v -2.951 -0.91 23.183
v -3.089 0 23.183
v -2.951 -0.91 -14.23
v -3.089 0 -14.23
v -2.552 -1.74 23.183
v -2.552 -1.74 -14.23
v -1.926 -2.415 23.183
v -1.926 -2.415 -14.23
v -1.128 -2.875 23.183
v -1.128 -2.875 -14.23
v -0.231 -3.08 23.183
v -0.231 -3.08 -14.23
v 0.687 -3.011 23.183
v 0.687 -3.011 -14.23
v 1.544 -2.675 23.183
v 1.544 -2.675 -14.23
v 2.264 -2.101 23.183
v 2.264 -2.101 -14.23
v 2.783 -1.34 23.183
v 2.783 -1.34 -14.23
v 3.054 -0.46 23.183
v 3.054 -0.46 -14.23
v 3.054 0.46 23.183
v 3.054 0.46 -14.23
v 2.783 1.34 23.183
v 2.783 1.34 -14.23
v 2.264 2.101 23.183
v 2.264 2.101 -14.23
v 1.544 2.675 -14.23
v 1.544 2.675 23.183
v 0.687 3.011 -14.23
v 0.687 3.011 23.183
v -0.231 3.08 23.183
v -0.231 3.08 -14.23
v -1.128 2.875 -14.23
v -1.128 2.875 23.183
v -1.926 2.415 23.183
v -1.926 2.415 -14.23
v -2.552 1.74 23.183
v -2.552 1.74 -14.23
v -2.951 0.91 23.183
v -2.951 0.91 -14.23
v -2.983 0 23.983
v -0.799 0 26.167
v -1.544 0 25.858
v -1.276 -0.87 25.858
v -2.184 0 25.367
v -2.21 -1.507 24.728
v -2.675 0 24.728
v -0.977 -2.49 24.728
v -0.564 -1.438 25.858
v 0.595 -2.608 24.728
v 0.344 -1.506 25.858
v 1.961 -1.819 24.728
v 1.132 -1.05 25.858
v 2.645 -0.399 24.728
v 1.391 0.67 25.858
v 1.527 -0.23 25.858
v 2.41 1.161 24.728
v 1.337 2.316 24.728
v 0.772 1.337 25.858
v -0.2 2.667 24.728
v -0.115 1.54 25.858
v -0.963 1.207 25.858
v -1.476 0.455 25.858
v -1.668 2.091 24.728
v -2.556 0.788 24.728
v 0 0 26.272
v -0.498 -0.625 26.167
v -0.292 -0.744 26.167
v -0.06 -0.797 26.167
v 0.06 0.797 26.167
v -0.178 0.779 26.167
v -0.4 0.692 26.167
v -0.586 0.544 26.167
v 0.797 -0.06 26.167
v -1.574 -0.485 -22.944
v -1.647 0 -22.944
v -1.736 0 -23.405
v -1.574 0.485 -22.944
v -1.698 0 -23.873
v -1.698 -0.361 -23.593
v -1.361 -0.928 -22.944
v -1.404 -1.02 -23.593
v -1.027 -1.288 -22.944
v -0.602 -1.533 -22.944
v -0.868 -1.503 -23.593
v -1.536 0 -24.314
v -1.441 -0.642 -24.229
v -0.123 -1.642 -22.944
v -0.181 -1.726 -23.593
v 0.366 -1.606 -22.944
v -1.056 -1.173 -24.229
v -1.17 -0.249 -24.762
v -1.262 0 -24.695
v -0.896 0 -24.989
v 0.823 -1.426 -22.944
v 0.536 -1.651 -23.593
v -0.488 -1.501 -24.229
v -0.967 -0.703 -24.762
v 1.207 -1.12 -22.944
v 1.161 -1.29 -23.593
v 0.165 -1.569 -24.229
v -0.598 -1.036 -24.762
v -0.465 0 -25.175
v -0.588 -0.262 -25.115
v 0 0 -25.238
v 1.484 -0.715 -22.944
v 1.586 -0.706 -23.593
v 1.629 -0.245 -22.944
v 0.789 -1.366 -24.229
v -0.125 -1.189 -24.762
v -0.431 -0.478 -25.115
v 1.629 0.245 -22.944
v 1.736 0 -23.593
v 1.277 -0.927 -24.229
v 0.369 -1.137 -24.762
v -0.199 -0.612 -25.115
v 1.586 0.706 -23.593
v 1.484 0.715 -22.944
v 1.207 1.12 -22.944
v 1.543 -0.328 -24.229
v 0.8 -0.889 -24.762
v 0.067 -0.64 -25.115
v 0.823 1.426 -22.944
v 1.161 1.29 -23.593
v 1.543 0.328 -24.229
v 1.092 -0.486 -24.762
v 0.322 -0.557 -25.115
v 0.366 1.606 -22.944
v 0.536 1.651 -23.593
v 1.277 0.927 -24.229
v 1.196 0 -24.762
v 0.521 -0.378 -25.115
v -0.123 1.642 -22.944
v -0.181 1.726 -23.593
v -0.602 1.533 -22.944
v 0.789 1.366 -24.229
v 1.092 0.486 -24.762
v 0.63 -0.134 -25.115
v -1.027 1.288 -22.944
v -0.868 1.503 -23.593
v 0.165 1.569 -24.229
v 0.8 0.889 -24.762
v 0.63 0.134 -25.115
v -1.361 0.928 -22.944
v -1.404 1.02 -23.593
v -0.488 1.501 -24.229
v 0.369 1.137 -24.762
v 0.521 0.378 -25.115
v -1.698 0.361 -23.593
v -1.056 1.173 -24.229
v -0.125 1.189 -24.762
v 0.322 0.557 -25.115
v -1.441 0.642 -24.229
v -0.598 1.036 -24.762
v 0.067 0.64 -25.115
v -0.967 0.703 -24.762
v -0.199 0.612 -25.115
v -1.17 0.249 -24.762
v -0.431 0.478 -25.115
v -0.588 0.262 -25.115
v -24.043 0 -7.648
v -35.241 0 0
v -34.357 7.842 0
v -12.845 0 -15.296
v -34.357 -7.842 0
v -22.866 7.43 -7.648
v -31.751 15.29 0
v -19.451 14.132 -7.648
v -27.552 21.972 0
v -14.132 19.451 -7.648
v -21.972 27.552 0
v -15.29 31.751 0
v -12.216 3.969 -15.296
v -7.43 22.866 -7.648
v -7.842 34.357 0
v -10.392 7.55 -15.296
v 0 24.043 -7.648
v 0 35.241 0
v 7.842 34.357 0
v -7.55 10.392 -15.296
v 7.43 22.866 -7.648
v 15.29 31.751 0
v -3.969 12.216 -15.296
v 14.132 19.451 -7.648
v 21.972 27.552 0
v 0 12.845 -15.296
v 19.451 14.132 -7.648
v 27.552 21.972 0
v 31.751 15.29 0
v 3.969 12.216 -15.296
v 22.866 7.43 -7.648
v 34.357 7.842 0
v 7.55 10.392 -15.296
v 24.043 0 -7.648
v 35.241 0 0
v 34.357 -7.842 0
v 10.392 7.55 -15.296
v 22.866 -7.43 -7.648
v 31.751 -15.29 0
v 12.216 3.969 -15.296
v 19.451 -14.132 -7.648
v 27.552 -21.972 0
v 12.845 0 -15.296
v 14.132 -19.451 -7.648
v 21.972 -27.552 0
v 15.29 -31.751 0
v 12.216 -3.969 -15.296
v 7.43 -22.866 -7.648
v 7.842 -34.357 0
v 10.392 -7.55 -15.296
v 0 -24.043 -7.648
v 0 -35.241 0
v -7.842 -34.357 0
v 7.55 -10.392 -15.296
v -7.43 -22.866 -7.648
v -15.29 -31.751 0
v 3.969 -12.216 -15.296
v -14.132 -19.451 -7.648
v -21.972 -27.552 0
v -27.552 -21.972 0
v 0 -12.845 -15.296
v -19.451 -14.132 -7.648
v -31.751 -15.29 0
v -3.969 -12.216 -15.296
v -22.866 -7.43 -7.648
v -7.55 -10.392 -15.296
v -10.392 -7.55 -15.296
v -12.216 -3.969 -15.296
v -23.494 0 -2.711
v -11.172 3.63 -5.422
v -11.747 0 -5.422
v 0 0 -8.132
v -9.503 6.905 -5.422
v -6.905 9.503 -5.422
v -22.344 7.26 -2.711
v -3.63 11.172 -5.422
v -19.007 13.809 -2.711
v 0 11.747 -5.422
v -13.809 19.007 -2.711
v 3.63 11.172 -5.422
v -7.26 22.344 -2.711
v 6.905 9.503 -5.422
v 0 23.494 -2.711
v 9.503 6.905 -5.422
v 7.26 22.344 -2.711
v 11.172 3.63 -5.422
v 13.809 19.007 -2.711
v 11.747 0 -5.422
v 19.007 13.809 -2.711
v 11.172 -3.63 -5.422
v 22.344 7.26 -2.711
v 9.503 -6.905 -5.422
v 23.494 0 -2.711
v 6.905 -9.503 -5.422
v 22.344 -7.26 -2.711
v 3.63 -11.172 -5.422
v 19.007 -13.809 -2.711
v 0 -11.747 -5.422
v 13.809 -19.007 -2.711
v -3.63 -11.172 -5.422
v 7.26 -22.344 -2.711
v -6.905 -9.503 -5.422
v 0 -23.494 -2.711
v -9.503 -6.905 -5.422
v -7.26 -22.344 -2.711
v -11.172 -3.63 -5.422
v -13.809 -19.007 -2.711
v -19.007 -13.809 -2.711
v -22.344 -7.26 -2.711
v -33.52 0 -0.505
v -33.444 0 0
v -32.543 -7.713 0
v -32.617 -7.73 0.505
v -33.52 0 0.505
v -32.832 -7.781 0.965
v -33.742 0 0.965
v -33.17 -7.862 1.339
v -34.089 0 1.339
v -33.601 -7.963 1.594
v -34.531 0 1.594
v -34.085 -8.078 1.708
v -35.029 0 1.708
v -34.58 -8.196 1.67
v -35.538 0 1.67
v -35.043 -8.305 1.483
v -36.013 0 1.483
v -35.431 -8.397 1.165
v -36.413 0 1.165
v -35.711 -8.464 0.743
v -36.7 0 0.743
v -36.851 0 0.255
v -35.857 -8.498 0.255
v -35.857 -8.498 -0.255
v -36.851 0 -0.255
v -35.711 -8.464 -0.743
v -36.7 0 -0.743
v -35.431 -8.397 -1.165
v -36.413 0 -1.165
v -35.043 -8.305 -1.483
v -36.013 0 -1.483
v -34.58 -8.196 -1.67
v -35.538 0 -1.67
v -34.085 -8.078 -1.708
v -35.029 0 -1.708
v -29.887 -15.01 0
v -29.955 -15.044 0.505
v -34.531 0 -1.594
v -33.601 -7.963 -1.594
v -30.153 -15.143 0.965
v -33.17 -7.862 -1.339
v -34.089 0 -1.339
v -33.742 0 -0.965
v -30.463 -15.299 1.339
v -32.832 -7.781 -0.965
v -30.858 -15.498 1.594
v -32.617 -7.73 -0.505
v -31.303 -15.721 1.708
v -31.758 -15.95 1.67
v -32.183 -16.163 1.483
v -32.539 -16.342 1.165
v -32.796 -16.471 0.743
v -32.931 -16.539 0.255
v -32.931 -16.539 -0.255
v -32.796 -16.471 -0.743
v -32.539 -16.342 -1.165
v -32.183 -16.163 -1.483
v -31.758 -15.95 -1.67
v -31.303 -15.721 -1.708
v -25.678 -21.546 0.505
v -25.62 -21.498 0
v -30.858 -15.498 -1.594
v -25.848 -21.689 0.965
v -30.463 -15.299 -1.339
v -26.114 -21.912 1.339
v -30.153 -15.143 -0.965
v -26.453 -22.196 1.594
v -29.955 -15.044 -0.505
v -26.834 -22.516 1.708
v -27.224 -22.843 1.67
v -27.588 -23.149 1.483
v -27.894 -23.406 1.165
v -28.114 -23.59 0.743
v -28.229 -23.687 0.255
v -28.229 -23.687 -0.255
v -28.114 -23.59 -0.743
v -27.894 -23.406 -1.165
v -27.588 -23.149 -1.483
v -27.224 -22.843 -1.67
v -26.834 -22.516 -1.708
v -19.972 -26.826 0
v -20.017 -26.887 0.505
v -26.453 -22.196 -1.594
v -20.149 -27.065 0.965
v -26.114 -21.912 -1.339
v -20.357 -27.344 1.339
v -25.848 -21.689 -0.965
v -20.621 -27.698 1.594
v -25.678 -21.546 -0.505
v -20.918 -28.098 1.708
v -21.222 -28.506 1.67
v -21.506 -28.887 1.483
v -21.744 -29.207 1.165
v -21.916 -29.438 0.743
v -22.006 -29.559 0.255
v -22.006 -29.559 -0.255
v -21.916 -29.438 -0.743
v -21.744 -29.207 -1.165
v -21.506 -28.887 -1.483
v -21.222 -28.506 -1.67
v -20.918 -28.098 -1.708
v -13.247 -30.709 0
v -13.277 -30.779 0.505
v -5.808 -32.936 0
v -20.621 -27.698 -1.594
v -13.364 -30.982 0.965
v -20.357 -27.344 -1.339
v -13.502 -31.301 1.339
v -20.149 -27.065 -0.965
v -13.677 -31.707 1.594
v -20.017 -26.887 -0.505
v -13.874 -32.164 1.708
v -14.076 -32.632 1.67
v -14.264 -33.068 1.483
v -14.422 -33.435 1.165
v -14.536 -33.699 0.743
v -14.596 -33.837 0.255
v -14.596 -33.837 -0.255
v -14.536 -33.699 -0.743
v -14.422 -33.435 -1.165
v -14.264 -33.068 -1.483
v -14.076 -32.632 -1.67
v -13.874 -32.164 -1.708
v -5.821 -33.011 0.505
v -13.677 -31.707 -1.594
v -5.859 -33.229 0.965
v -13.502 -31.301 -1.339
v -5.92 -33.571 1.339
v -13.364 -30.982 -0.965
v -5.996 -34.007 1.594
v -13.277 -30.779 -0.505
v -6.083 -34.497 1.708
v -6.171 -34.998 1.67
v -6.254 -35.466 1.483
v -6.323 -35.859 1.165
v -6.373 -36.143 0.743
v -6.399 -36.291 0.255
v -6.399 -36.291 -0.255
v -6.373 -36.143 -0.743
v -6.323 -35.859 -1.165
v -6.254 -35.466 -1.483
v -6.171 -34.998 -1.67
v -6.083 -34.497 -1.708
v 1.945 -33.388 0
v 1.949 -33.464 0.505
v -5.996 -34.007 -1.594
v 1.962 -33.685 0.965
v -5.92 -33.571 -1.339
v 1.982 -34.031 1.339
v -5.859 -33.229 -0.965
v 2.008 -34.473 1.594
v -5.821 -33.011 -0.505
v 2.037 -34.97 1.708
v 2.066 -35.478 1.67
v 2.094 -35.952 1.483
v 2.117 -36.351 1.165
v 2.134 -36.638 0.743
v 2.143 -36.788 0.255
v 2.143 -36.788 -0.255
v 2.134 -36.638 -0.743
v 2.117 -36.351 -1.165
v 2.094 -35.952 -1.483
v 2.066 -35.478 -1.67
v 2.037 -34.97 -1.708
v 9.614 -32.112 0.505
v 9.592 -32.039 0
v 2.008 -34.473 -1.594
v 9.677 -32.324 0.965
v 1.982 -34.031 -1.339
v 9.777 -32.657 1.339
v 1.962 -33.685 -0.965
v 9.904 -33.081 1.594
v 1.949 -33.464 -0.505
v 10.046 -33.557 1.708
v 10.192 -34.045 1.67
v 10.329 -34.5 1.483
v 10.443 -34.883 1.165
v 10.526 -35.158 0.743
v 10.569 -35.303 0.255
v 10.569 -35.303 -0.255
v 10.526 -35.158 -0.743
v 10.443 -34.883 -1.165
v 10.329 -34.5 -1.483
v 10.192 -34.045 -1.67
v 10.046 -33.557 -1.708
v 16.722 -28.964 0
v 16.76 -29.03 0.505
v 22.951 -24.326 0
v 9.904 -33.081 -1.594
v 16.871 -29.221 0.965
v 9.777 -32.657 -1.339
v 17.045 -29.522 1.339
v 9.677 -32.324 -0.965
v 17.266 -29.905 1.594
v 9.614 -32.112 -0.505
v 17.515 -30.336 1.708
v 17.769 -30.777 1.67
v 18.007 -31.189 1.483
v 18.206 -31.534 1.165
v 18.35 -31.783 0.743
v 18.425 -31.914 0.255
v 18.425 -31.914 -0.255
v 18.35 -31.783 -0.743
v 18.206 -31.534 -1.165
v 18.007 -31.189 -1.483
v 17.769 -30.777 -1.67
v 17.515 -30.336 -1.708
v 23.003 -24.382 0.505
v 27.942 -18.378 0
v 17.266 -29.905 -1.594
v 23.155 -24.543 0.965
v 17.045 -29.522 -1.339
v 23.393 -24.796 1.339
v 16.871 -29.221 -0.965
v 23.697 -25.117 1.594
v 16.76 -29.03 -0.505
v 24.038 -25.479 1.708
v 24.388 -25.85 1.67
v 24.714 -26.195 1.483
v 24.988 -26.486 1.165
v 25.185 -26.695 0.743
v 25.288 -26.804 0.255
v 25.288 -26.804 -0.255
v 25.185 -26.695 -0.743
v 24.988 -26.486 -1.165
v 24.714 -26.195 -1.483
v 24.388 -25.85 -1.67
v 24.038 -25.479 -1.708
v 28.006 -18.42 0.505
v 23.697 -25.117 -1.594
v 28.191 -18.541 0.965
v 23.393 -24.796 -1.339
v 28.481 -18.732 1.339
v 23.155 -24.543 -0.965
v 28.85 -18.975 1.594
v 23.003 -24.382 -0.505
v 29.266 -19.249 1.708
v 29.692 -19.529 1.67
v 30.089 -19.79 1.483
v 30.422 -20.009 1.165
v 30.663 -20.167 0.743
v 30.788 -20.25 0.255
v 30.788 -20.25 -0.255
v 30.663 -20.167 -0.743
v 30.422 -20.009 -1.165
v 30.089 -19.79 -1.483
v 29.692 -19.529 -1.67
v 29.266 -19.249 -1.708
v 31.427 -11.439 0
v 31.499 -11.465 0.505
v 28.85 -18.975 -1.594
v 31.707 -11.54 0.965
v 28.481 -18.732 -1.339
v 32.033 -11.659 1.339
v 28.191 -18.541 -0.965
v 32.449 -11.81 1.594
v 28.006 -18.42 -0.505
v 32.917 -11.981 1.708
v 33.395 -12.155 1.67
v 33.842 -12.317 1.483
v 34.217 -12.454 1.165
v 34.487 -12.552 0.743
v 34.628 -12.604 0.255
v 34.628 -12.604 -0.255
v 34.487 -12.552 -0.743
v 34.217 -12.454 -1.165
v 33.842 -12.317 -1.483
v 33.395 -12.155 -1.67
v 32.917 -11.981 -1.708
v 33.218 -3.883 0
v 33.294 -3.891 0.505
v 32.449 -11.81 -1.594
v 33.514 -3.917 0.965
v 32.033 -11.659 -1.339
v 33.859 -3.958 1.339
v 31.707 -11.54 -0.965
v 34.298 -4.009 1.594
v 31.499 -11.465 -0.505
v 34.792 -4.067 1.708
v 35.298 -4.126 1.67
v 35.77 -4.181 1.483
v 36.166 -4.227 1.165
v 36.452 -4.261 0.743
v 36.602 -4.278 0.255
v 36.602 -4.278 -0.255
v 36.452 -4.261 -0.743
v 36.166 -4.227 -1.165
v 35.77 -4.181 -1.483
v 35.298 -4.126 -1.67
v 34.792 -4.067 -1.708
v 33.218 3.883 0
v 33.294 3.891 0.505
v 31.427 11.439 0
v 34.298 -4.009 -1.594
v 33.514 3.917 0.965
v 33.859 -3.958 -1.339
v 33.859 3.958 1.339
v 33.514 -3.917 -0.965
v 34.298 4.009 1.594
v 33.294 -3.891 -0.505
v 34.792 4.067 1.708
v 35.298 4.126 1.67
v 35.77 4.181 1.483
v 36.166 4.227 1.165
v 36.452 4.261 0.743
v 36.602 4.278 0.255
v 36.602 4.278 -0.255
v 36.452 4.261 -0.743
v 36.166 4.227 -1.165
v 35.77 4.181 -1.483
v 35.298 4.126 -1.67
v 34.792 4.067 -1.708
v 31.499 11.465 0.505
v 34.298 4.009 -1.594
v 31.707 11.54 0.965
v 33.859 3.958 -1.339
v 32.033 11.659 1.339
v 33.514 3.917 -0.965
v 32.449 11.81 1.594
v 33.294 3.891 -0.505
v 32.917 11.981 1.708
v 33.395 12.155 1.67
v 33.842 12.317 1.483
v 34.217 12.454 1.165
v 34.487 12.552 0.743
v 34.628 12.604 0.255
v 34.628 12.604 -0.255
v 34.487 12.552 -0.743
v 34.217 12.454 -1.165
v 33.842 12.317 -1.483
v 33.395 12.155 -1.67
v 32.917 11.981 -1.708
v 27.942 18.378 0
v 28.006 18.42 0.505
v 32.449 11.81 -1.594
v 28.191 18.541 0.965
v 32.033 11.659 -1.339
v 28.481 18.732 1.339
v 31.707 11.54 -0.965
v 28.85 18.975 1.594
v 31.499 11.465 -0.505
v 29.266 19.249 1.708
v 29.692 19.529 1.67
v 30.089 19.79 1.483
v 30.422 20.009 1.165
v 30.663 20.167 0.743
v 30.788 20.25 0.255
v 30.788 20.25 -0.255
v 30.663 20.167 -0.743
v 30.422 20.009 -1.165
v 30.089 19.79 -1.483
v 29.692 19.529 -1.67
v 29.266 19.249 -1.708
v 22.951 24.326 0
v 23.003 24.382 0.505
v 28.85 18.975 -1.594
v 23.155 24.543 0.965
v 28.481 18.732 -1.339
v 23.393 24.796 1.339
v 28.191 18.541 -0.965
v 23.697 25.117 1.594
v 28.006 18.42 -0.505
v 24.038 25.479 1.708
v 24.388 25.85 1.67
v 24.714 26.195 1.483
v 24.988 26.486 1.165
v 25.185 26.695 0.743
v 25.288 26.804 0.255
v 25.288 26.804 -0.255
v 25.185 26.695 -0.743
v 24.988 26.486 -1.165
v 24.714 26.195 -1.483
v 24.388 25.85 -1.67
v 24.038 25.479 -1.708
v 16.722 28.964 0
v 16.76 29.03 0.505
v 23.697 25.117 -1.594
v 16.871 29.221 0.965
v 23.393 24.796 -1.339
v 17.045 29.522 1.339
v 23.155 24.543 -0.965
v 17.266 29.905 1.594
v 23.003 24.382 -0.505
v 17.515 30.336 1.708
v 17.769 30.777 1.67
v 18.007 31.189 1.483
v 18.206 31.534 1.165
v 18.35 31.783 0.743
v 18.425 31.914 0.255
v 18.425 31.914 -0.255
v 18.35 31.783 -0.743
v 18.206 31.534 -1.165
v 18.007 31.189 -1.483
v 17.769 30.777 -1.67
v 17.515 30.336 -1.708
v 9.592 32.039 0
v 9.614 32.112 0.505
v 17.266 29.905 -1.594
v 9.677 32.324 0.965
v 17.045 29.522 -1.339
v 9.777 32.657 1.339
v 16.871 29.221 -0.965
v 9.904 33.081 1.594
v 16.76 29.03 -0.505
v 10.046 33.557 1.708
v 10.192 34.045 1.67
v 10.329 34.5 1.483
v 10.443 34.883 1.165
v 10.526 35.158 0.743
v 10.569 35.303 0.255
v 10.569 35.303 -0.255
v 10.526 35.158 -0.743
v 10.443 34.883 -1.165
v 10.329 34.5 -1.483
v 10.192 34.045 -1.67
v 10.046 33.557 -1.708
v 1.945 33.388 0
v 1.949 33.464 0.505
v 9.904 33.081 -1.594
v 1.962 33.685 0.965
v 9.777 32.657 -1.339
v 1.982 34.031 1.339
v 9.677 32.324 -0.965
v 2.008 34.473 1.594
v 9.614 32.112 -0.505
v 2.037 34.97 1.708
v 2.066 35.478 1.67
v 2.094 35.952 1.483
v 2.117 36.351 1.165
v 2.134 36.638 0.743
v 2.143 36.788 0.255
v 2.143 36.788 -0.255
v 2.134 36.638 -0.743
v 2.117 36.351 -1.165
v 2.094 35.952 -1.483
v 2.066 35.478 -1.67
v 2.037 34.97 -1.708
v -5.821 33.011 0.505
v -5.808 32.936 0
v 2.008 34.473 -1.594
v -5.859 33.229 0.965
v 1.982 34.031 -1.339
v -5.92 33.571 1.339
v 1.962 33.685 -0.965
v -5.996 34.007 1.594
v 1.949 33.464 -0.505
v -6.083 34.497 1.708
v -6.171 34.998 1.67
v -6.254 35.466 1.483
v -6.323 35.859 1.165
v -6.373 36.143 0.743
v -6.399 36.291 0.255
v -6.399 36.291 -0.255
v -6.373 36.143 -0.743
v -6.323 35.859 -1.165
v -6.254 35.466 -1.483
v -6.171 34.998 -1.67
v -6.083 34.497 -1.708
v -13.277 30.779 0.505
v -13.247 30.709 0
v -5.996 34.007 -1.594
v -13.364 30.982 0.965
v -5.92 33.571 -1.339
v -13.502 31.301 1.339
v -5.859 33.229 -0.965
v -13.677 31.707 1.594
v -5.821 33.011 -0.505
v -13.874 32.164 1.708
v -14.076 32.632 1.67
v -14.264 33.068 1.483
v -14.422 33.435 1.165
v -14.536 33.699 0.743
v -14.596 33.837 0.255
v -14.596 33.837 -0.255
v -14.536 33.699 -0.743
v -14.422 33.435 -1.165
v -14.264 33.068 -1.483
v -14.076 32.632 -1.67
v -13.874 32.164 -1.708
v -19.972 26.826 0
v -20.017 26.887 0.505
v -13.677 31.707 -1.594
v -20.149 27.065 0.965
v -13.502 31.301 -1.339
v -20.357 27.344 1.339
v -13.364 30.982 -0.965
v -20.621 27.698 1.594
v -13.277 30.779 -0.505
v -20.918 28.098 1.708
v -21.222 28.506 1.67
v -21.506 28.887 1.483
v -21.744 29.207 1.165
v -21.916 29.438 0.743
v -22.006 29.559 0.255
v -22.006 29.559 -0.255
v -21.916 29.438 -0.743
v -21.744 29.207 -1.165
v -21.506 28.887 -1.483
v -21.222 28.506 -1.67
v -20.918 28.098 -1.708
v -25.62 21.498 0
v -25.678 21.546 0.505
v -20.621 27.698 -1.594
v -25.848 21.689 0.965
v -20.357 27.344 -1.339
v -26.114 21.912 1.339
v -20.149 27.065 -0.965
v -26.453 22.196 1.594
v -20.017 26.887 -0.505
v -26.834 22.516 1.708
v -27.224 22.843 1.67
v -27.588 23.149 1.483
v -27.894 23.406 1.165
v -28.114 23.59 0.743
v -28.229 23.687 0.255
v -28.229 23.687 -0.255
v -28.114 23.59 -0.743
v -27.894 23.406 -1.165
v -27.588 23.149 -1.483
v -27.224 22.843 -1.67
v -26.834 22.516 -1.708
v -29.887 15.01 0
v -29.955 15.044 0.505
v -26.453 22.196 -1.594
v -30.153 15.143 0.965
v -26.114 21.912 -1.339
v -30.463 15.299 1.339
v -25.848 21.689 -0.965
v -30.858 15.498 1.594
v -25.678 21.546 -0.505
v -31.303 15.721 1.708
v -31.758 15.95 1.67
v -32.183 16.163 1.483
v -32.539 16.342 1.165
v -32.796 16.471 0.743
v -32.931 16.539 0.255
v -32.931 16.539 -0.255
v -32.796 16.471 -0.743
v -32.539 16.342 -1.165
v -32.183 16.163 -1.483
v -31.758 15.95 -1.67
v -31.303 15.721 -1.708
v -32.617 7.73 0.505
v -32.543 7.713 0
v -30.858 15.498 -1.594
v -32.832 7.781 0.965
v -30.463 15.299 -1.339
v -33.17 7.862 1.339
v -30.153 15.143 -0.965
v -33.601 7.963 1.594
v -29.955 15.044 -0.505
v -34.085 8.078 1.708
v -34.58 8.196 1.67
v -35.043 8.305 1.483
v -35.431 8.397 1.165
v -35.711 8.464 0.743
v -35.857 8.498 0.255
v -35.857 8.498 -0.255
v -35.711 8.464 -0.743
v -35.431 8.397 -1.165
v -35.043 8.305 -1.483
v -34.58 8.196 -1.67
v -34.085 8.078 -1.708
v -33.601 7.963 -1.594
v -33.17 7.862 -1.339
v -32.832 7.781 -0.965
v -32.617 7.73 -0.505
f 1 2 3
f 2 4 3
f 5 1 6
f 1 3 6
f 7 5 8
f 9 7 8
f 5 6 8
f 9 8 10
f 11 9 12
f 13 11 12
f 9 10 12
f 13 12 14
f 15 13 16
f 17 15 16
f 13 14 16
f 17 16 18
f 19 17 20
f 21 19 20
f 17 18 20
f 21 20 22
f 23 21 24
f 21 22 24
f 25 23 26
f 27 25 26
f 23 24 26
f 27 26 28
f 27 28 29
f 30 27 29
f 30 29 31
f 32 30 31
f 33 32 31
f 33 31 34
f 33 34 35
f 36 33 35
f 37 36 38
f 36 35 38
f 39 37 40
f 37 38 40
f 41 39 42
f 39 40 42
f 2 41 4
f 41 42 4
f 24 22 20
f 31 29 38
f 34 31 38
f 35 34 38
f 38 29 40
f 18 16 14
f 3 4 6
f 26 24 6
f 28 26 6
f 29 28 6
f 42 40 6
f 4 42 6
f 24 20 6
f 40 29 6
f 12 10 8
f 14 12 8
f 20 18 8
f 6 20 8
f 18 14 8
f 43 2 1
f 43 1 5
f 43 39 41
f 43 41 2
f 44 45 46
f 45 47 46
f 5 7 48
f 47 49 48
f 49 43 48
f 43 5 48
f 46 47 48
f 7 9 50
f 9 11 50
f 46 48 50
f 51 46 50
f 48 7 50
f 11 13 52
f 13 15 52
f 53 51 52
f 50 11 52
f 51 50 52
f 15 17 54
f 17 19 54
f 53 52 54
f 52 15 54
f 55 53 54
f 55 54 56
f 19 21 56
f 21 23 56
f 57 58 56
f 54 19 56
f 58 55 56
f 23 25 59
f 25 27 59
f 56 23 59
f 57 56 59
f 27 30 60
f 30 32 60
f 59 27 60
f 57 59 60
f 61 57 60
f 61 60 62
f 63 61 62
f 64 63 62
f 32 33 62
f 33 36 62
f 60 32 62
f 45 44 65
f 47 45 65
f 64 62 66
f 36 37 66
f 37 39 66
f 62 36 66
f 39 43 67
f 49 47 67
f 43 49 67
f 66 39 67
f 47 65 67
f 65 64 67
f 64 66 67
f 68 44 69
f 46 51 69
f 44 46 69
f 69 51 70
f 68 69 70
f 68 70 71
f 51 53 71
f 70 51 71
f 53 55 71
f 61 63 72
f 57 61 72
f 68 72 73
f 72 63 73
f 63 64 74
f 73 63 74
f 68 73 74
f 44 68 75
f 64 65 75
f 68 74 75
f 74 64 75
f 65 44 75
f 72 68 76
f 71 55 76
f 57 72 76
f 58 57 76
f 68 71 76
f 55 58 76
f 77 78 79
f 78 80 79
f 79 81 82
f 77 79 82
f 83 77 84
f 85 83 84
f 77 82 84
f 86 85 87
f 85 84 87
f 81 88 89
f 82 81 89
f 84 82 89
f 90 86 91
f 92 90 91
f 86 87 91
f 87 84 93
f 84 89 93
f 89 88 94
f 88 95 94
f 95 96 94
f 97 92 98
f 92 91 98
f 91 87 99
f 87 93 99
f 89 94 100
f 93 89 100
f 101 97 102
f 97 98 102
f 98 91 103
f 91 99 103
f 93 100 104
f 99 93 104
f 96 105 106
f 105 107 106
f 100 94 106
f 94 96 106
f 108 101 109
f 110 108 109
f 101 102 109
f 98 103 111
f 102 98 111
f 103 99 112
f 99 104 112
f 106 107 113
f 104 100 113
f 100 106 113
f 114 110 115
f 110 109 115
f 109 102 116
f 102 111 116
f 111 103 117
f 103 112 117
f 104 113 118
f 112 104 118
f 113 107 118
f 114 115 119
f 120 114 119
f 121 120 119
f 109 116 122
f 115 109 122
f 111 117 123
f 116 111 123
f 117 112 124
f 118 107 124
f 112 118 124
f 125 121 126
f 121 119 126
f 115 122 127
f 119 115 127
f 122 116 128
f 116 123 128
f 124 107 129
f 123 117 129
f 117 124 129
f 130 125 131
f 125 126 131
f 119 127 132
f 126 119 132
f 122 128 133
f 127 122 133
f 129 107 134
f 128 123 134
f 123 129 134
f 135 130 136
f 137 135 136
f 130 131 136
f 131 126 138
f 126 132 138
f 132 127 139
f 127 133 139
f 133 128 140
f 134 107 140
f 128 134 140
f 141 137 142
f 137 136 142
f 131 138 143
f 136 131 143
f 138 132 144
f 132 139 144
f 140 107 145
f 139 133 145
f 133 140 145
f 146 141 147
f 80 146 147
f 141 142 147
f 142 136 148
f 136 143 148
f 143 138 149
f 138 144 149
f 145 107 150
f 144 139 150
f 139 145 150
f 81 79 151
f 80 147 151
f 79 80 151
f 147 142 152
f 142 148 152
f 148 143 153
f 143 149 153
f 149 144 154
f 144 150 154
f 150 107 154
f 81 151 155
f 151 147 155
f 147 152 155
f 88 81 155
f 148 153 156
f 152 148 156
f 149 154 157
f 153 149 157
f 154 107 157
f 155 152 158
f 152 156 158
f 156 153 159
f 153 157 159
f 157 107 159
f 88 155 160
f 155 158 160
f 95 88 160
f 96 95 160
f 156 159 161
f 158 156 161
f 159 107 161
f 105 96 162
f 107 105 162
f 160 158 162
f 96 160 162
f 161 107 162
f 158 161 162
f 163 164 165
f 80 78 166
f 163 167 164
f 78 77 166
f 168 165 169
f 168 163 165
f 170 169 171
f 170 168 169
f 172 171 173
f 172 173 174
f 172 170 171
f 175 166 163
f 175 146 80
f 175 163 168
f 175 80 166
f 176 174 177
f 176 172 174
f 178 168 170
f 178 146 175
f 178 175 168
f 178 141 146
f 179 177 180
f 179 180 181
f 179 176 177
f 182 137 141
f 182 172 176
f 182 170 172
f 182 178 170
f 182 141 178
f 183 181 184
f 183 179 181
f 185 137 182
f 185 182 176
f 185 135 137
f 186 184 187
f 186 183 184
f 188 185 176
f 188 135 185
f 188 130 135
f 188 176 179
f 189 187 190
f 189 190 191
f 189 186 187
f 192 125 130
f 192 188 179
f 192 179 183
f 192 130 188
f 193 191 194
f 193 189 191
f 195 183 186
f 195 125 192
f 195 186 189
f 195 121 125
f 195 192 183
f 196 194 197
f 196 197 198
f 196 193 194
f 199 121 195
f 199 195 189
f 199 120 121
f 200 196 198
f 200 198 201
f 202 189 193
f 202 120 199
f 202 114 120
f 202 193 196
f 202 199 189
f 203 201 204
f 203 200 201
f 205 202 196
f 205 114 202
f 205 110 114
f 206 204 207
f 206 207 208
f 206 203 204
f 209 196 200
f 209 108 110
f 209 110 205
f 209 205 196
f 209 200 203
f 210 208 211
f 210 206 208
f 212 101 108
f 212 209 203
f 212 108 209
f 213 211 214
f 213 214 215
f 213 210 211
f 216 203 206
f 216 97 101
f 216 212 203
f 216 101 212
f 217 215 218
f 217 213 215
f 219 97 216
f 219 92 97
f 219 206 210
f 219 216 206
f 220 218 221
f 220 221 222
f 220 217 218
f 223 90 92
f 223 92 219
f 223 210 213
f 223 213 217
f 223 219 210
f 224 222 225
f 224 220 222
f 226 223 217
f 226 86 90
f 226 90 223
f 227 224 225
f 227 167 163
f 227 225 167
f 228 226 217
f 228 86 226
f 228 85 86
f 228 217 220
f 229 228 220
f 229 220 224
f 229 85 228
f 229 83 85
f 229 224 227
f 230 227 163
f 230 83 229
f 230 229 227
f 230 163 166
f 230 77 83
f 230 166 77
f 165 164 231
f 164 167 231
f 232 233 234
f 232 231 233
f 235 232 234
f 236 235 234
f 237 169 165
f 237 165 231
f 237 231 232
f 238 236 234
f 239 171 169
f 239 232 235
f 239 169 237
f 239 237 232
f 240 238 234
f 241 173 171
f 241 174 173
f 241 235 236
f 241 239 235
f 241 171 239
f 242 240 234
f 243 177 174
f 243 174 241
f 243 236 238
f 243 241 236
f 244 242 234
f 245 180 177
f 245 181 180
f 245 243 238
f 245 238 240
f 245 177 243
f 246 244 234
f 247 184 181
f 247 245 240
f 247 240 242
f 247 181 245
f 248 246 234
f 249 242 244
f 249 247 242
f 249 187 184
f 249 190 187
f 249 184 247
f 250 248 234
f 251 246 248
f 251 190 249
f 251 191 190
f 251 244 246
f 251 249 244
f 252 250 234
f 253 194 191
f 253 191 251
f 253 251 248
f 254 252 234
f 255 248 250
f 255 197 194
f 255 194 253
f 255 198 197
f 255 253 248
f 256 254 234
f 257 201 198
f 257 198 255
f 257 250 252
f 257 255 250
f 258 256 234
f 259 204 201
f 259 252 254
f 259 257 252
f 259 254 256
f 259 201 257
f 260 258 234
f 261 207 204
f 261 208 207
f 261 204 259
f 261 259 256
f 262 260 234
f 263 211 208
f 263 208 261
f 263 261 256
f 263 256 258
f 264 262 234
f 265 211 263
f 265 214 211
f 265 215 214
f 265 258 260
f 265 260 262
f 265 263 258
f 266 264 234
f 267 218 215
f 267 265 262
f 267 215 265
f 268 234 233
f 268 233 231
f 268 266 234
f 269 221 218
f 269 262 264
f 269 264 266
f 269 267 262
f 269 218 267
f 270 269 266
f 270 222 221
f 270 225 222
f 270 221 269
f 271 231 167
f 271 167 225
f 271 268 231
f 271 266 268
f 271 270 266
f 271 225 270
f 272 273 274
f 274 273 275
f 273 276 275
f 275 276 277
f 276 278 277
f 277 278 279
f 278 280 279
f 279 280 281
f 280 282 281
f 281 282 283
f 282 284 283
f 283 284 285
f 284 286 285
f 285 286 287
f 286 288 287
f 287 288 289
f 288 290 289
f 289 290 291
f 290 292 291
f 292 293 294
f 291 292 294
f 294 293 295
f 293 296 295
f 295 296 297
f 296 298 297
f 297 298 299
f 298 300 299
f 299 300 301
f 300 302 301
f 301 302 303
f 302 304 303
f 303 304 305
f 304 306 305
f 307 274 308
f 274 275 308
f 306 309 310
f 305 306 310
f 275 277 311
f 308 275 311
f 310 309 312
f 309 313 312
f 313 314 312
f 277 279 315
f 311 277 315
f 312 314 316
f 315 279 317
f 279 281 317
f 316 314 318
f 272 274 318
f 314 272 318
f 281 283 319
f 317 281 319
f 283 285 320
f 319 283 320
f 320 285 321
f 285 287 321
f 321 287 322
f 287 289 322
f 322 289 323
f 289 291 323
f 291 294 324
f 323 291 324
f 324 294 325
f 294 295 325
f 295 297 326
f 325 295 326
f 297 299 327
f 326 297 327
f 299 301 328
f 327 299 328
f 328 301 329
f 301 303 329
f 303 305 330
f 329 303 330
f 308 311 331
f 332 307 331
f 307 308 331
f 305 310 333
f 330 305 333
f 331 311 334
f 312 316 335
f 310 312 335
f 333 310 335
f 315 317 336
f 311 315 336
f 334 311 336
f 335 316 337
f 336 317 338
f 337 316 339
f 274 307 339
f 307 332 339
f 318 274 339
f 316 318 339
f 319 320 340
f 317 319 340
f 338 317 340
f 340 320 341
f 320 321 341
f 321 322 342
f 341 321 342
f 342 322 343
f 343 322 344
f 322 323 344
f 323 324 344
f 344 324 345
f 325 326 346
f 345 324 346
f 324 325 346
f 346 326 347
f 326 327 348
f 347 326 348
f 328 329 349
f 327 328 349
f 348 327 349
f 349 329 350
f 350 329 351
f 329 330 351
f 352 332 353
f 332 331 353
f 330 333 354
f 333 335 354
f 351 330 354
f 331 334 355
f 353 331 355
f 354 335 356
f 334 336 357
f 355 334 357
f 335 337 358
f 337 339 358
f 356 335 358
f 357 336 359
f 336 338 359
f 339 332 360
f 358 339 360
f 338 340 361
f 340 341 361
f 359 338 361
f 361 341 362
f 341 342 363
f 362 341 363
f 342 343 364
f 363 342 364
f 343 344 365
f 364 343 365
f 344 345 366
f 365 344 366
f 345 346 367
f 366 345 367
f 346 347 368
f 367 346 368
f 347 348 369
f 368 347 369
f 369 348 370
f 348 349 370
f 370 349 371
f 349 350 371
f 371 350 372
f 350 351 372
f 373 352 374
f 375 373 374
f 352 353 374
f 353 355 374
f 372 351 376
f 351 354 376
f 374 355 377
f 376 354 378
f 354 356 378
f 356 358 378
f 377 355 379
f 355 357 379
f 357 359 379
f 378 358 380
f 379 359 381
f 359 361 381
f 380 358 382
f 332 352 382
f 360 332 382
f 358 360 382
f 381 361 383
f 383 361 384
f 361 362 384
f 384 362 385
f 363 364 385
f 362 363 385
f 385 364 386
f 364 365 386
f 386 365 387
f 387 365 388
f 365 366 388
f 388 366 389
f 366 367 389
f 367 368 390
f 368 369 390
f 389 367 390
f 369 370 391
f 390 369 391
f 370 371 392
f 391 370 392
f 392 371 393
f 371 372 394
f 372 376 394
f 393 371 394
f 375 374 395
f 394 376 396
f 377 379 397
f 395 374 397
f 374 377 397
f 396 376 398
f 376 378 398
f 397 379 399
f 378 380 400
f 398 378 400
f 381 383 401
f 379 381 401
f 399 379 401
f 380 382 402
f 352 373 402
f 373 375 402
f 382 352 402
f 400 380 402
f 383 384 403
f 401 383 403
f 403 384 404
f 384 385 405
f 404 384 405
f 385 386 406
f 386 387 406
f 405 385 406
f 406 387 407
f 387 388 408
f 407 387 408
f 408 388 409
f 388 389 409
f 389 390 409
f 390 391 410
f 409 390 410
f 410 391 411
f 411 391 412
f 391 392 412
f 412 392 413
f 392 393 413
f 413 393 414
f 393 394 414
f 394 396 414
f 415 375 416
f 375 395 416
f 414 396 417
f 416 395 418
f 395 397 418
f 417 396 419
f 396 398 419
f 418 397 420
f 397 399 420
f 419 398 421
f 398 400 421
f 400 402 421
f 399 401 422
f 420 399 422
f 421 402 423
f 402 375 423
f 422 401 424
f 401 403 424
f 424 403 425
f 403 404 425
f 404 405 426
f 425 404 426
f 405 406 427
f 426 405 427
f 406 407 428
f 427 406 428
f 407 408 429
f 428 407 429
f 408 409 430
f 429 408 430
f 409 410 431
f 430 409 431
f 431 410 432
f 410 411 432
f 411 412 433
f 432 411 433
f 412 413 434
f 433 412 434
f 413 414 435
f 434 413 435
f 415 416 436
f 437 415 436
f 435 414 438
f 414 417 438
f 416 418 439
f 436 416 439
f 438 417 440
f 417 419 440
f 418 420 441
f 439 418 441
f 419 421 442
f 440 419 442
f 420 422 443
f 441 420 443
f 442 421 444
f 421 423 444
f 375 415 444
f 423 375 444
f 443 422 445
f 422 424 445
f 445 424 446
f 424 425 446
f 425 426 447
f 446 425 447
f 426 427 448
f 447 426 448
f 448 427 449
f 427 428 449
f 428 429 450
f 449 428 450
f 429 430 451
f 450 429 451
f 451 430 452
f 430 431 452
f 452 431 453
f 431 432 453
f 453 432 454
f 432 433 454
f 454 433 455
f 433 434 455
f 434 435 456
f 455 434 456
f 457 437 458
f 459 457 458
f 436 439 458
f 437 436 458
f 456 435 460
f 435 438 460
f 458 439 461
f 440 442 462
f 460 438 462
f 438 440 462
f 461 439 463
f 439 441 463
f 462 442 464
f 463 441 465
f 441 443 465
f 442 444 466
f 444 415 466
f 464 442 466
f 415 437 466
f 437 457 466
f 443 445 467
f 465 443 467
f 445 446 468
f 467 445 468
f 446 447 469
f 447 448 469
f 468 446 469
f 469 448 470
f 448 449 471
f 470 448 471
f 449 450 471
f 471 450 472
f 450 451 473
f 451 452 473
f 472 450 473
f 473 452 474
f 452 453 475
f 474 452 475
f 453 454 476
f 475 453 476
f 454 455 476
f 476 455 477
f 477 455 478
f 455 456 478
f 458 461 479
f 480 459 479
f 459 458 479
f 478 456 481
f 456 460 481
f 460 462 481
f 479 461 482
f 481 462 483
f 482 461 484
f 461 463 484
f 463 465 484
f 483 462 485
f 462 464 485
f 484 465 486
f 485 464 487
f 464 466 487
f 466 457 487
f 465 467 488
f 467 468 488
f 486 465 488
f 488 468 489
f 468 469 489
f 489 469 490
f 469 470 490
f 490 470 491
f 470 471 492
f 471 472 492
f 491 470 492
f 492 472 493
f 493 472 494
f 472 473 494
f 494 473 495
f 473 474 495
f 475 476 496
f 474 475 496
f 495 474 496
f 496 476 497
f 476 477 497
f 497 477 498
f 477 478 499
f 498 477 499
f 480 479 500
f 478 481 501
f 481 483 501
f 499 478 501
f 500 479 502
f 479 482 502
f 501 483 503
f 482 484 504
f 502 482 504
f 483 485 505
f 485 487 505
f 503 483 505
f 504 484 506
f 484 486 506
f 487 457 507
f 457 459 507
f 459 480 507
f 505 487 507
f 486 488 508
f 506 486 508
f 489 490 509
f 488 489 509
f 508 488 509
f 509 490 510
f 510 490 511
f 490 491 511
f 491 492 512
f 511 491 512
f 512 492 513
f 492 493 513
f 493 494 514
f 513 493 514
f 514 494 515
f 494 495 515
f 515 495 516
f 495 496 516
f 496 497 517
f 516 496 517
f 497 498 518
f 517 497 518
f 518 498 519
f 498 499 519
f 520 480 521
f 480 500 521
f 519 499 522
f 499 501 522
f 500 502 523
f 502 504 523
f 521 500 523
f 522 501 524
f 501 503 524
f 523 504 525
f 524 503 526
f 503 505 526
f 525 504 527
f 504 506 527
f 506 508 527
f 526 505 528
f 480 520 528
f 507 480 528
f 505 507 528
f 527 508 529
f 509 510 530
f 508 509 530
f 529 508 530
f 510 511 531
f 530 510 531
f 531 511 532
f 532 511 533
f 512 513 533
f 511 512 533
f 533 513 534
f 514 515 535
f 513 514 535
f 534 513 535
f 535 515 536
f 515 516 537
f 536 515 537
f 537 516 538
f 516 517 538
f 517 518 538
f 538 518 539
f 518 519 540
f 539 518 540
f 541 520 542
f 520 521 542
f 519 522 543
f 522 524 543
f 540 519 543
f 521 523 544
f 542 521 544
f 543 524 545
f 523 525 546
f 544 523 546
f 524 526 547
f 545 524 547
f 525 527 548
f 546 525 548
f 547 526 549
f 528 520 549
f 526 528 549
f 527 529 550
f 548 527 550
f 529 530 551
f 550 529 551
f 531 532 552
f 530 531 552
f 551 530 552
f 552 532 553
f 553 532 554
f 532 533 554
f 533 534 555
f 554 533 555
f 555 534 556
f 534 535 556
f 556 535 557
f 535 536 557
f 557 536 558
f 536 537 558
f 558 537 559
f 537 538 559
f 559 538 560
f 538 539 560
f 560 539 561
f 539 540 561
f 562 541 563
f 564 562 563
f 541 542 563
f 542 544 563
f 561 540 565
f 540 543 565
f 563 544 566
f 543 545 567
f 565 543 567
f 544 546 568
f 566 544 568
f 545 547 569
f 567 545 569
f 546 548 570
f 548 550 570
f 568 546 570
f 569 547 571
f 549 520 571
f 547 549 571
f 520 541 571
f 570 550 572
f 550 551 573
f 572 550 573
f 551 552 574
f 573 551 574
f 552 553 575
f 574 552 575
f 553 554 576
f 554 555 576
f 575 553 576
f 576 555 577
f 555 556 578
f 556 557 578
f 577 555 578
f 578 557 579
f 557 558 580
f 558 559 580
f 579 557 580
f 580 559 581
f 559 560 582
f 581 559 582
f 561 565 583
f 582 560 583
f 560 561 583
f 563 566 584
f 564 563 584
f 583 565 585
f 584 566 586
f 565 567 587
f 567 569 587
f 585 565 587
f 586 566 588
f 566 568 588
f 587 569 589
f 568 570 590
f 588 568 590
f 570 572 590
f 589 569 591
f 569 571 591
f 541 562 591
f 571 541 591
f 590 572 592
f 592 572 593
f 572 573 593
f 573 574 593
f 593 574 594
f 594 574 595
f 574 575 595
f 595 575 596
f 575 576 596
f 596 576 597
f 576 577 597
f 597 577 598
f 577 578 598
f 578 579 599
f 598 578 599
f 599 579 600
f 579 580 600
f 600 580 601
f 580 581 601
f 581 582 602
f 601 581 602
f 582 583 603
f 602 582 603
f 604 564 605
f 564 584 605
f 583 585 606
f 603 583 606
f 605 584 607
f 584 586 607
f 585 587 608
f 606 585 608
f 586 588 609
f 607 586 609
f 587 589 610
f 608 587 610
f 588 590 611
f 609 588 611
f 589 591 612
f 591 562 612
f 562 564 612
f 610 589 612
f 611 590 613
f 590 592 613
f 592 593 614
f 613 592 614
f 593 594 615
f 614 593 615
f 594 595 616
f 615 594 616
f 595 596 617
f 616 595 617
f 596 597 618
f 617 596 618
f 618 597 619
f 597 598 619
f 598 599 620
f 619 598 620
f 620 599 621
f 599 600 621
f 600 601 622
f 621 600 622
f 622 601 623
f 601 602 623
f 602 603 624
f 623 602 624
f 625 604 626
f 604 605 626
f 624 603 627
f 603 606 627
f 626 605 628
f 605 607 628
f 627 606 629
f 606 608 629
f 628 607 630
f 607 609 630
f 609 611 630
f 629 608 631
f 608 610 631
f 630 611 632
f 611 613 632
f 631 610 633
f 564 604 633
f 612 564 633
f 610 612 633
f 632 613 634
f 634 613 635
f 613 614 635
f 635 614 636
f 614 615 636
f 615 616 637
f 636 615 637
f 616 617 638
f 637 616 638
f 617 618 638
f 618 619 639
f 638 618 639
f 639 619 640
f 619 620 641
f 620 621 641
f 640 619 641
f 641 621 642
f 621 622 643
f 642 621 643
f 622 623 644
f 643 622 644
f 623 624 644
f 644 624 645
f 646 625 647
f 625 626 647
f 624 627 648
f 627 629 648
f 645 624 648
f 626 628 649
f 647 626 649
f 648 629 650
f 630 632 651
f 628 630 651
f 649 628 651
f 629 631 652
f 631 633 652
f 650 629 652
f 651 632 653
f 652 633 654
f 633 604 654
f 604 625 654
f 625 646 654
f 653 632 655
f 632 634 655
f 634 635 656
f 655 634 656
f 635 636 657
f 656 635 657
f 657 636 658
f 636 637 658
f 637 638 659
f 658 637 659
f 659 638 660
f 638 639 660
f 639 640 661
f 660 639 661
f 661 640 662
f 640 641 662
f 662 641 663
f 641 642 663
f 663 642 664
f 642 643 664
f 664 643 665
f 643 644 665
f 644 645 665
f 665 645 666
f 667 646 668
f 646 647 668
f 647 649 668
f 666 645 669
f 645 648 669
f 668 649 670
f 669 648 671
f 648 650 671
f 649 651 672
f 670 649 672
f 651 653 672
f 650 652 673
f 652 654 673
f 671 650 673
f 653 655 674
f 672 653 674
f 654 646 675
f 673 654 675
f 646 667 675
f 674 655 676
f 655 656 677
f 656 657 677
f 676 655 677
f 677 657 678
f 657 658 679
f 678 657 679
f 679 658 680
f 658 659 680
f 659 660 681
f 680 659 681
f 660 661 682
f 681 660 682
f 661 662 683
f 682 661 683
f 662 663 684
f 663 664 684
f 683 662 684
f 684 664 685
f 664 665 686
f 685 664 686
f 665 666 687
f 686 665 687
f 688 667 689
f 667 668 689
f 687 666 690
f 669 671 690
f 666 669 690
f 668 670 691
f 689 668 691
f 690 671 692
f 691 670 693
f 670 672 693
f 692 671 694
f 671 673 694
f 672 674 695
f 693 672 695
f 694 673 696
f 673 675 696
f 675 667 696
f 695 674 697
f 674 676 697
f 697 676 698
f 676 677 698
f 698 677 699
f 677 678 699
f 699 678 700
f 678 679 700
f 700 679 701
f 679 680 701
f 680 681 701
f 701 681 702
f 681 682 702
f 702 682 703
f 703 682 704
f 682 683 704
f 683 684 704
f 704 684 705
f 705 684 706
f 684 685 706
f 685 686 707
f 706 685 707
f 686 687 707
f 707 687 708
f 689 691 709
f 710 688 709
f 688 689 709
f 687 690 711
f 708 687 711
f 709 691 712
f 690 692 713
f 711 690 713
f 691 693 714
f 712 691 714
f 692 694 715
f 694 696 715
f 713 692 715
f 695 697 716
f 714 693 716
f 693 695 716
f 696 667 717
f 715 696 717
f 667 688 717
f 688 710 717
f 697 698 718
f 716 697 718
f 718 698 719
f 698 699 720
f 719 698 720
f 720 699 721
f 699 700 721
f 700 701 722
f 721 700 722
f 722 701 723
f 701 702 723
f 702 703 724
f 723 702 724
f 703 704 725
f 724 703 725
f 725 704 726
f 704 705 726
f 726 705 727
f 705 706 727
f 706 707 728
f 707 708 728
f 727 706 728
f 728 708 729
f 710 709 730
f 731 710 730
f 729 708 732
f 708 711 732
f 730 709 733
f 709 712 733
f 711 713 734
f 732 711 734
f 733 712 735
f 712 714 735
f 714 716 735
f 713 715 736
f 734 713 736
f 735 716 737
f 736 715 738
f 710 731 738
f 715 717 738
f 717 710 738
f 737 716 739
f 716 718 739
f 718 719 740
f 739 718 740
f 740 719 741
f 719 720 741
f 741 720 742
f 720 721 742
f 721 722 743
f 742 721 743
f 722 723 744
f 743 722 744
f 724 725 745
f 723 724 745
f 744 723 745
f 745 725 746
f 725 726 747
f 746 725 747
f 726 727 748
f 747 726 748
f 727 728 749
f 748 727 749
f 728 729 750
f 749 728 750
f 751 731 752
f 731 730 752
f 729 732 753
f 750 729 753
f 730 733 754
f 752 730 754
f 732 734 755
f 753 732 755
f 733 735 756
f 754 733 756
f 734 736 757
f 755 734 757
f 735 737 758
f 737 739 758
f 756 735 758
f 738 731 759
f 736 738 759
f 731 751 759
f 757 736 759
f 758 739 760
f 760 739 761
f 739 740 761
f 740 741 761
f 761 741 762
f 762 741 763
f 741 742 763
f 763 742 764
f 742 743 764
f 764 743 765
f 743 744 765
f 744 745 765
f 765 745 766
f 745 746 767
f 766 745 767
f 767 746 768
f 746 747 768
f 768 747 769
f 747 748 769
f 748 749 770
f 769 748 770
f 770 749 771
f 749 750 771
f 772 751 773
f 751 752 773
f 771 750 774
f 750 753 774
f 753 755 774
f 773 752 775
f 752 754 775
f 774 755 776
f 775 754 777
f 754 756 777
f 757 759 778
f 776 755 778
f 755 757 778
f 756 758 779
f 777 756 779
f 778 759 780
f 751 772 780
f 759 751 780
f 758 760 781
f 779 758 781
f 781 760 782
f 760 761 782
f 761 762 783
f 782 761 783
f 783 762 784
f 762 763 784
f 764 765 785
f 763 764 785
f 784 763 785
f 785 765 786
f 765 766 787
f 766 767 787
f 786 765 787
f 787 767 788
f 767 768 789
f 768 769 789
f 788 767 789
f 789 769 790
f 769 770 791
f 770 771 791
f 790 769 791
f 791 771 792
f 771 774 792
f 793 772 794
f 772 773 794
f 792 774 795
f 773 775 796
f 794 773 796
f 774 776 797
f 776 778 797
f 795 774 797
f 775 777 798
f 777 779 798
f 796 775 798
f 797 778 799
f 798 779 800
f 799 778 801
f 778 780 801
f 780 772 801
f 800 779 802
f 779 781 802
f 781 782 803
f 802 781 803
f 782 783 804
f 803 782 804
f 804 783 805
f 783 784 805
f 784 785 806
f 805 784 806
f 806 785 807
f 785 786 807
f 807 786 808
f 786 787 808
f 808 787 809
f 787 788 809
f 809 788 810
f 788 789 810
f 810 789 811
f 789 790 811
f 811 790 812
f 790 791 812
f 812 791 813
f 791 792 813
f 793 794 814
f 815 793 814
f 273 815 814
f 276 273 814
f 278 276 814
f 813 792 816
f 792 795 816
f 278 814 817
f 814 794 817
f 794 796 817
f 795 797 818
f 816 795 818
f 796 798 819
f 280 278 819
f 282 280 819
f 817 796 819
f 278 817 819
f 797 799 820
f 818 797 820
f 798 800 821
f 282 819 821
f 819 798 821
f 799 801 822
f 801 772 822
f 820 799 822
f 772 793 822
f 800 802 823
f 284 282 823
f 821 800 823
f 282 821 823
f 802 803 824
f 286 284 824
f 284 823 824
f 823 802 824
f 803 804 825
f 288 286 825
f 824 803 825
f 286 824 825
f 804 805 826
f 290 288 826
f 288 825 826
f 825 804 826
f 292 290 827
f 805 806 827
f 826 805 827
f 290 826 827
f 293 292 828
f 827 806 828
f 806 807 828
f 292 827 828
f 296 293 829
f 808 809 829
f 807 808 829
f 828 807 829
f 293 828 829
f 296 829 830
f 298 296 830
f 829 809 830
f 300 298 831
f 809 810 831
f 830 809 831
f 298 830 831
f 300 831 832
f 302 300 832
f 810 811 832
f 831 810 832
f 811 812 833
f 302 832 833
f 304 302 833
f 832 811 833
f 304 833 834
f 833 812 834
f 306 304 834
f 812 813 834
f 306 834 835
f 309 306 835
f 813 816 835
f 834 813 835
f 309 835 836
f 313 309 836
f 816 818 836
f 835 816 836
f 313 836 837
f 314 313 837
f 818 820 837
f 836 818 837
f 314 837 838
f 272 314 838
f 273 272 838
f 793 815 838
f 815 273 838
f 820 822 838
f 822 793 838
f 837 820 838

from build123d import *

# Parameters (mm, degrees)
F6_R = 1.712756


with BuildPart() as f1:
    # F0 (on Front) → F1 (revolve)
    with BuildSketch(Plane.XZ):
        Polygon((-35.240546, 0), (0, -24.068717), (0, -8.132434), align=None)
    revolve(axis=Axis((0, 0, -16.100575), (0, 0, -1)))

    # F4 (on Front) → F5 (revolve)
    with BuildSketch(Plane.XZ):
        with BuildLine():
            Line((0, -25.238145), (0, -21.761551))
            ThreePointArc((0, -21.761551), (-1.738297, -23.499848), (0, -25.238145))
        make_face()
    revolve(axis=Axis((0, 0, -23.499848), (0, 0, 1)))


with BuildPart() as f3:
    # F2 (on Front) → F3 (revolve)
    with BuildSketch(Plane.XZ):
        with BuildLine():
            Line((-3.08859, -14.229668), (0, -14.229668))
            Line((0, -14.229668), (0, 20.094648))
            ThreePointArc((0, 20.094648), (-2.183963, 20.999275), (-3.08859, 23.183238))
            Line((-3.08859, 23.183238), (-3.08859, -14.229668))
        make_face()
        with BuildLine():
            ThreePointArc((-3.08859, 23.183238), (-2.183963, 20.999275), (0, 20.094648))
            Line((0, 20.094648), (0, 23.183238))
            Line((0, 23.183238), (-3.08859, 23.183238))
        make_face()
        with BuildLine():
            ThreePointArc((0, 26.271828), (-2.183963, 25.367201), (-3.08859, 23.183238))
            Line((-3.08859, 23.183238), (0, 23.183238))
            Line((0, 23.183238), (0, 26.271828))
        make_face()
    revolve(axis=Axis((0, 0, 4.476785), (0, 0, 1)))


with BuildPart() as f7:
    # F6 (on Front) → F7 (revolve)
    with BuildSketch(Plane.XZ):
        with Locations((-35.157047, 0)):
            Circle(F6_R)
    revolve(axis=Axis((0, 0, 2.209123), (0, 0, 1)))


solid = Compound([f1.part, f3.part, f7.part])
